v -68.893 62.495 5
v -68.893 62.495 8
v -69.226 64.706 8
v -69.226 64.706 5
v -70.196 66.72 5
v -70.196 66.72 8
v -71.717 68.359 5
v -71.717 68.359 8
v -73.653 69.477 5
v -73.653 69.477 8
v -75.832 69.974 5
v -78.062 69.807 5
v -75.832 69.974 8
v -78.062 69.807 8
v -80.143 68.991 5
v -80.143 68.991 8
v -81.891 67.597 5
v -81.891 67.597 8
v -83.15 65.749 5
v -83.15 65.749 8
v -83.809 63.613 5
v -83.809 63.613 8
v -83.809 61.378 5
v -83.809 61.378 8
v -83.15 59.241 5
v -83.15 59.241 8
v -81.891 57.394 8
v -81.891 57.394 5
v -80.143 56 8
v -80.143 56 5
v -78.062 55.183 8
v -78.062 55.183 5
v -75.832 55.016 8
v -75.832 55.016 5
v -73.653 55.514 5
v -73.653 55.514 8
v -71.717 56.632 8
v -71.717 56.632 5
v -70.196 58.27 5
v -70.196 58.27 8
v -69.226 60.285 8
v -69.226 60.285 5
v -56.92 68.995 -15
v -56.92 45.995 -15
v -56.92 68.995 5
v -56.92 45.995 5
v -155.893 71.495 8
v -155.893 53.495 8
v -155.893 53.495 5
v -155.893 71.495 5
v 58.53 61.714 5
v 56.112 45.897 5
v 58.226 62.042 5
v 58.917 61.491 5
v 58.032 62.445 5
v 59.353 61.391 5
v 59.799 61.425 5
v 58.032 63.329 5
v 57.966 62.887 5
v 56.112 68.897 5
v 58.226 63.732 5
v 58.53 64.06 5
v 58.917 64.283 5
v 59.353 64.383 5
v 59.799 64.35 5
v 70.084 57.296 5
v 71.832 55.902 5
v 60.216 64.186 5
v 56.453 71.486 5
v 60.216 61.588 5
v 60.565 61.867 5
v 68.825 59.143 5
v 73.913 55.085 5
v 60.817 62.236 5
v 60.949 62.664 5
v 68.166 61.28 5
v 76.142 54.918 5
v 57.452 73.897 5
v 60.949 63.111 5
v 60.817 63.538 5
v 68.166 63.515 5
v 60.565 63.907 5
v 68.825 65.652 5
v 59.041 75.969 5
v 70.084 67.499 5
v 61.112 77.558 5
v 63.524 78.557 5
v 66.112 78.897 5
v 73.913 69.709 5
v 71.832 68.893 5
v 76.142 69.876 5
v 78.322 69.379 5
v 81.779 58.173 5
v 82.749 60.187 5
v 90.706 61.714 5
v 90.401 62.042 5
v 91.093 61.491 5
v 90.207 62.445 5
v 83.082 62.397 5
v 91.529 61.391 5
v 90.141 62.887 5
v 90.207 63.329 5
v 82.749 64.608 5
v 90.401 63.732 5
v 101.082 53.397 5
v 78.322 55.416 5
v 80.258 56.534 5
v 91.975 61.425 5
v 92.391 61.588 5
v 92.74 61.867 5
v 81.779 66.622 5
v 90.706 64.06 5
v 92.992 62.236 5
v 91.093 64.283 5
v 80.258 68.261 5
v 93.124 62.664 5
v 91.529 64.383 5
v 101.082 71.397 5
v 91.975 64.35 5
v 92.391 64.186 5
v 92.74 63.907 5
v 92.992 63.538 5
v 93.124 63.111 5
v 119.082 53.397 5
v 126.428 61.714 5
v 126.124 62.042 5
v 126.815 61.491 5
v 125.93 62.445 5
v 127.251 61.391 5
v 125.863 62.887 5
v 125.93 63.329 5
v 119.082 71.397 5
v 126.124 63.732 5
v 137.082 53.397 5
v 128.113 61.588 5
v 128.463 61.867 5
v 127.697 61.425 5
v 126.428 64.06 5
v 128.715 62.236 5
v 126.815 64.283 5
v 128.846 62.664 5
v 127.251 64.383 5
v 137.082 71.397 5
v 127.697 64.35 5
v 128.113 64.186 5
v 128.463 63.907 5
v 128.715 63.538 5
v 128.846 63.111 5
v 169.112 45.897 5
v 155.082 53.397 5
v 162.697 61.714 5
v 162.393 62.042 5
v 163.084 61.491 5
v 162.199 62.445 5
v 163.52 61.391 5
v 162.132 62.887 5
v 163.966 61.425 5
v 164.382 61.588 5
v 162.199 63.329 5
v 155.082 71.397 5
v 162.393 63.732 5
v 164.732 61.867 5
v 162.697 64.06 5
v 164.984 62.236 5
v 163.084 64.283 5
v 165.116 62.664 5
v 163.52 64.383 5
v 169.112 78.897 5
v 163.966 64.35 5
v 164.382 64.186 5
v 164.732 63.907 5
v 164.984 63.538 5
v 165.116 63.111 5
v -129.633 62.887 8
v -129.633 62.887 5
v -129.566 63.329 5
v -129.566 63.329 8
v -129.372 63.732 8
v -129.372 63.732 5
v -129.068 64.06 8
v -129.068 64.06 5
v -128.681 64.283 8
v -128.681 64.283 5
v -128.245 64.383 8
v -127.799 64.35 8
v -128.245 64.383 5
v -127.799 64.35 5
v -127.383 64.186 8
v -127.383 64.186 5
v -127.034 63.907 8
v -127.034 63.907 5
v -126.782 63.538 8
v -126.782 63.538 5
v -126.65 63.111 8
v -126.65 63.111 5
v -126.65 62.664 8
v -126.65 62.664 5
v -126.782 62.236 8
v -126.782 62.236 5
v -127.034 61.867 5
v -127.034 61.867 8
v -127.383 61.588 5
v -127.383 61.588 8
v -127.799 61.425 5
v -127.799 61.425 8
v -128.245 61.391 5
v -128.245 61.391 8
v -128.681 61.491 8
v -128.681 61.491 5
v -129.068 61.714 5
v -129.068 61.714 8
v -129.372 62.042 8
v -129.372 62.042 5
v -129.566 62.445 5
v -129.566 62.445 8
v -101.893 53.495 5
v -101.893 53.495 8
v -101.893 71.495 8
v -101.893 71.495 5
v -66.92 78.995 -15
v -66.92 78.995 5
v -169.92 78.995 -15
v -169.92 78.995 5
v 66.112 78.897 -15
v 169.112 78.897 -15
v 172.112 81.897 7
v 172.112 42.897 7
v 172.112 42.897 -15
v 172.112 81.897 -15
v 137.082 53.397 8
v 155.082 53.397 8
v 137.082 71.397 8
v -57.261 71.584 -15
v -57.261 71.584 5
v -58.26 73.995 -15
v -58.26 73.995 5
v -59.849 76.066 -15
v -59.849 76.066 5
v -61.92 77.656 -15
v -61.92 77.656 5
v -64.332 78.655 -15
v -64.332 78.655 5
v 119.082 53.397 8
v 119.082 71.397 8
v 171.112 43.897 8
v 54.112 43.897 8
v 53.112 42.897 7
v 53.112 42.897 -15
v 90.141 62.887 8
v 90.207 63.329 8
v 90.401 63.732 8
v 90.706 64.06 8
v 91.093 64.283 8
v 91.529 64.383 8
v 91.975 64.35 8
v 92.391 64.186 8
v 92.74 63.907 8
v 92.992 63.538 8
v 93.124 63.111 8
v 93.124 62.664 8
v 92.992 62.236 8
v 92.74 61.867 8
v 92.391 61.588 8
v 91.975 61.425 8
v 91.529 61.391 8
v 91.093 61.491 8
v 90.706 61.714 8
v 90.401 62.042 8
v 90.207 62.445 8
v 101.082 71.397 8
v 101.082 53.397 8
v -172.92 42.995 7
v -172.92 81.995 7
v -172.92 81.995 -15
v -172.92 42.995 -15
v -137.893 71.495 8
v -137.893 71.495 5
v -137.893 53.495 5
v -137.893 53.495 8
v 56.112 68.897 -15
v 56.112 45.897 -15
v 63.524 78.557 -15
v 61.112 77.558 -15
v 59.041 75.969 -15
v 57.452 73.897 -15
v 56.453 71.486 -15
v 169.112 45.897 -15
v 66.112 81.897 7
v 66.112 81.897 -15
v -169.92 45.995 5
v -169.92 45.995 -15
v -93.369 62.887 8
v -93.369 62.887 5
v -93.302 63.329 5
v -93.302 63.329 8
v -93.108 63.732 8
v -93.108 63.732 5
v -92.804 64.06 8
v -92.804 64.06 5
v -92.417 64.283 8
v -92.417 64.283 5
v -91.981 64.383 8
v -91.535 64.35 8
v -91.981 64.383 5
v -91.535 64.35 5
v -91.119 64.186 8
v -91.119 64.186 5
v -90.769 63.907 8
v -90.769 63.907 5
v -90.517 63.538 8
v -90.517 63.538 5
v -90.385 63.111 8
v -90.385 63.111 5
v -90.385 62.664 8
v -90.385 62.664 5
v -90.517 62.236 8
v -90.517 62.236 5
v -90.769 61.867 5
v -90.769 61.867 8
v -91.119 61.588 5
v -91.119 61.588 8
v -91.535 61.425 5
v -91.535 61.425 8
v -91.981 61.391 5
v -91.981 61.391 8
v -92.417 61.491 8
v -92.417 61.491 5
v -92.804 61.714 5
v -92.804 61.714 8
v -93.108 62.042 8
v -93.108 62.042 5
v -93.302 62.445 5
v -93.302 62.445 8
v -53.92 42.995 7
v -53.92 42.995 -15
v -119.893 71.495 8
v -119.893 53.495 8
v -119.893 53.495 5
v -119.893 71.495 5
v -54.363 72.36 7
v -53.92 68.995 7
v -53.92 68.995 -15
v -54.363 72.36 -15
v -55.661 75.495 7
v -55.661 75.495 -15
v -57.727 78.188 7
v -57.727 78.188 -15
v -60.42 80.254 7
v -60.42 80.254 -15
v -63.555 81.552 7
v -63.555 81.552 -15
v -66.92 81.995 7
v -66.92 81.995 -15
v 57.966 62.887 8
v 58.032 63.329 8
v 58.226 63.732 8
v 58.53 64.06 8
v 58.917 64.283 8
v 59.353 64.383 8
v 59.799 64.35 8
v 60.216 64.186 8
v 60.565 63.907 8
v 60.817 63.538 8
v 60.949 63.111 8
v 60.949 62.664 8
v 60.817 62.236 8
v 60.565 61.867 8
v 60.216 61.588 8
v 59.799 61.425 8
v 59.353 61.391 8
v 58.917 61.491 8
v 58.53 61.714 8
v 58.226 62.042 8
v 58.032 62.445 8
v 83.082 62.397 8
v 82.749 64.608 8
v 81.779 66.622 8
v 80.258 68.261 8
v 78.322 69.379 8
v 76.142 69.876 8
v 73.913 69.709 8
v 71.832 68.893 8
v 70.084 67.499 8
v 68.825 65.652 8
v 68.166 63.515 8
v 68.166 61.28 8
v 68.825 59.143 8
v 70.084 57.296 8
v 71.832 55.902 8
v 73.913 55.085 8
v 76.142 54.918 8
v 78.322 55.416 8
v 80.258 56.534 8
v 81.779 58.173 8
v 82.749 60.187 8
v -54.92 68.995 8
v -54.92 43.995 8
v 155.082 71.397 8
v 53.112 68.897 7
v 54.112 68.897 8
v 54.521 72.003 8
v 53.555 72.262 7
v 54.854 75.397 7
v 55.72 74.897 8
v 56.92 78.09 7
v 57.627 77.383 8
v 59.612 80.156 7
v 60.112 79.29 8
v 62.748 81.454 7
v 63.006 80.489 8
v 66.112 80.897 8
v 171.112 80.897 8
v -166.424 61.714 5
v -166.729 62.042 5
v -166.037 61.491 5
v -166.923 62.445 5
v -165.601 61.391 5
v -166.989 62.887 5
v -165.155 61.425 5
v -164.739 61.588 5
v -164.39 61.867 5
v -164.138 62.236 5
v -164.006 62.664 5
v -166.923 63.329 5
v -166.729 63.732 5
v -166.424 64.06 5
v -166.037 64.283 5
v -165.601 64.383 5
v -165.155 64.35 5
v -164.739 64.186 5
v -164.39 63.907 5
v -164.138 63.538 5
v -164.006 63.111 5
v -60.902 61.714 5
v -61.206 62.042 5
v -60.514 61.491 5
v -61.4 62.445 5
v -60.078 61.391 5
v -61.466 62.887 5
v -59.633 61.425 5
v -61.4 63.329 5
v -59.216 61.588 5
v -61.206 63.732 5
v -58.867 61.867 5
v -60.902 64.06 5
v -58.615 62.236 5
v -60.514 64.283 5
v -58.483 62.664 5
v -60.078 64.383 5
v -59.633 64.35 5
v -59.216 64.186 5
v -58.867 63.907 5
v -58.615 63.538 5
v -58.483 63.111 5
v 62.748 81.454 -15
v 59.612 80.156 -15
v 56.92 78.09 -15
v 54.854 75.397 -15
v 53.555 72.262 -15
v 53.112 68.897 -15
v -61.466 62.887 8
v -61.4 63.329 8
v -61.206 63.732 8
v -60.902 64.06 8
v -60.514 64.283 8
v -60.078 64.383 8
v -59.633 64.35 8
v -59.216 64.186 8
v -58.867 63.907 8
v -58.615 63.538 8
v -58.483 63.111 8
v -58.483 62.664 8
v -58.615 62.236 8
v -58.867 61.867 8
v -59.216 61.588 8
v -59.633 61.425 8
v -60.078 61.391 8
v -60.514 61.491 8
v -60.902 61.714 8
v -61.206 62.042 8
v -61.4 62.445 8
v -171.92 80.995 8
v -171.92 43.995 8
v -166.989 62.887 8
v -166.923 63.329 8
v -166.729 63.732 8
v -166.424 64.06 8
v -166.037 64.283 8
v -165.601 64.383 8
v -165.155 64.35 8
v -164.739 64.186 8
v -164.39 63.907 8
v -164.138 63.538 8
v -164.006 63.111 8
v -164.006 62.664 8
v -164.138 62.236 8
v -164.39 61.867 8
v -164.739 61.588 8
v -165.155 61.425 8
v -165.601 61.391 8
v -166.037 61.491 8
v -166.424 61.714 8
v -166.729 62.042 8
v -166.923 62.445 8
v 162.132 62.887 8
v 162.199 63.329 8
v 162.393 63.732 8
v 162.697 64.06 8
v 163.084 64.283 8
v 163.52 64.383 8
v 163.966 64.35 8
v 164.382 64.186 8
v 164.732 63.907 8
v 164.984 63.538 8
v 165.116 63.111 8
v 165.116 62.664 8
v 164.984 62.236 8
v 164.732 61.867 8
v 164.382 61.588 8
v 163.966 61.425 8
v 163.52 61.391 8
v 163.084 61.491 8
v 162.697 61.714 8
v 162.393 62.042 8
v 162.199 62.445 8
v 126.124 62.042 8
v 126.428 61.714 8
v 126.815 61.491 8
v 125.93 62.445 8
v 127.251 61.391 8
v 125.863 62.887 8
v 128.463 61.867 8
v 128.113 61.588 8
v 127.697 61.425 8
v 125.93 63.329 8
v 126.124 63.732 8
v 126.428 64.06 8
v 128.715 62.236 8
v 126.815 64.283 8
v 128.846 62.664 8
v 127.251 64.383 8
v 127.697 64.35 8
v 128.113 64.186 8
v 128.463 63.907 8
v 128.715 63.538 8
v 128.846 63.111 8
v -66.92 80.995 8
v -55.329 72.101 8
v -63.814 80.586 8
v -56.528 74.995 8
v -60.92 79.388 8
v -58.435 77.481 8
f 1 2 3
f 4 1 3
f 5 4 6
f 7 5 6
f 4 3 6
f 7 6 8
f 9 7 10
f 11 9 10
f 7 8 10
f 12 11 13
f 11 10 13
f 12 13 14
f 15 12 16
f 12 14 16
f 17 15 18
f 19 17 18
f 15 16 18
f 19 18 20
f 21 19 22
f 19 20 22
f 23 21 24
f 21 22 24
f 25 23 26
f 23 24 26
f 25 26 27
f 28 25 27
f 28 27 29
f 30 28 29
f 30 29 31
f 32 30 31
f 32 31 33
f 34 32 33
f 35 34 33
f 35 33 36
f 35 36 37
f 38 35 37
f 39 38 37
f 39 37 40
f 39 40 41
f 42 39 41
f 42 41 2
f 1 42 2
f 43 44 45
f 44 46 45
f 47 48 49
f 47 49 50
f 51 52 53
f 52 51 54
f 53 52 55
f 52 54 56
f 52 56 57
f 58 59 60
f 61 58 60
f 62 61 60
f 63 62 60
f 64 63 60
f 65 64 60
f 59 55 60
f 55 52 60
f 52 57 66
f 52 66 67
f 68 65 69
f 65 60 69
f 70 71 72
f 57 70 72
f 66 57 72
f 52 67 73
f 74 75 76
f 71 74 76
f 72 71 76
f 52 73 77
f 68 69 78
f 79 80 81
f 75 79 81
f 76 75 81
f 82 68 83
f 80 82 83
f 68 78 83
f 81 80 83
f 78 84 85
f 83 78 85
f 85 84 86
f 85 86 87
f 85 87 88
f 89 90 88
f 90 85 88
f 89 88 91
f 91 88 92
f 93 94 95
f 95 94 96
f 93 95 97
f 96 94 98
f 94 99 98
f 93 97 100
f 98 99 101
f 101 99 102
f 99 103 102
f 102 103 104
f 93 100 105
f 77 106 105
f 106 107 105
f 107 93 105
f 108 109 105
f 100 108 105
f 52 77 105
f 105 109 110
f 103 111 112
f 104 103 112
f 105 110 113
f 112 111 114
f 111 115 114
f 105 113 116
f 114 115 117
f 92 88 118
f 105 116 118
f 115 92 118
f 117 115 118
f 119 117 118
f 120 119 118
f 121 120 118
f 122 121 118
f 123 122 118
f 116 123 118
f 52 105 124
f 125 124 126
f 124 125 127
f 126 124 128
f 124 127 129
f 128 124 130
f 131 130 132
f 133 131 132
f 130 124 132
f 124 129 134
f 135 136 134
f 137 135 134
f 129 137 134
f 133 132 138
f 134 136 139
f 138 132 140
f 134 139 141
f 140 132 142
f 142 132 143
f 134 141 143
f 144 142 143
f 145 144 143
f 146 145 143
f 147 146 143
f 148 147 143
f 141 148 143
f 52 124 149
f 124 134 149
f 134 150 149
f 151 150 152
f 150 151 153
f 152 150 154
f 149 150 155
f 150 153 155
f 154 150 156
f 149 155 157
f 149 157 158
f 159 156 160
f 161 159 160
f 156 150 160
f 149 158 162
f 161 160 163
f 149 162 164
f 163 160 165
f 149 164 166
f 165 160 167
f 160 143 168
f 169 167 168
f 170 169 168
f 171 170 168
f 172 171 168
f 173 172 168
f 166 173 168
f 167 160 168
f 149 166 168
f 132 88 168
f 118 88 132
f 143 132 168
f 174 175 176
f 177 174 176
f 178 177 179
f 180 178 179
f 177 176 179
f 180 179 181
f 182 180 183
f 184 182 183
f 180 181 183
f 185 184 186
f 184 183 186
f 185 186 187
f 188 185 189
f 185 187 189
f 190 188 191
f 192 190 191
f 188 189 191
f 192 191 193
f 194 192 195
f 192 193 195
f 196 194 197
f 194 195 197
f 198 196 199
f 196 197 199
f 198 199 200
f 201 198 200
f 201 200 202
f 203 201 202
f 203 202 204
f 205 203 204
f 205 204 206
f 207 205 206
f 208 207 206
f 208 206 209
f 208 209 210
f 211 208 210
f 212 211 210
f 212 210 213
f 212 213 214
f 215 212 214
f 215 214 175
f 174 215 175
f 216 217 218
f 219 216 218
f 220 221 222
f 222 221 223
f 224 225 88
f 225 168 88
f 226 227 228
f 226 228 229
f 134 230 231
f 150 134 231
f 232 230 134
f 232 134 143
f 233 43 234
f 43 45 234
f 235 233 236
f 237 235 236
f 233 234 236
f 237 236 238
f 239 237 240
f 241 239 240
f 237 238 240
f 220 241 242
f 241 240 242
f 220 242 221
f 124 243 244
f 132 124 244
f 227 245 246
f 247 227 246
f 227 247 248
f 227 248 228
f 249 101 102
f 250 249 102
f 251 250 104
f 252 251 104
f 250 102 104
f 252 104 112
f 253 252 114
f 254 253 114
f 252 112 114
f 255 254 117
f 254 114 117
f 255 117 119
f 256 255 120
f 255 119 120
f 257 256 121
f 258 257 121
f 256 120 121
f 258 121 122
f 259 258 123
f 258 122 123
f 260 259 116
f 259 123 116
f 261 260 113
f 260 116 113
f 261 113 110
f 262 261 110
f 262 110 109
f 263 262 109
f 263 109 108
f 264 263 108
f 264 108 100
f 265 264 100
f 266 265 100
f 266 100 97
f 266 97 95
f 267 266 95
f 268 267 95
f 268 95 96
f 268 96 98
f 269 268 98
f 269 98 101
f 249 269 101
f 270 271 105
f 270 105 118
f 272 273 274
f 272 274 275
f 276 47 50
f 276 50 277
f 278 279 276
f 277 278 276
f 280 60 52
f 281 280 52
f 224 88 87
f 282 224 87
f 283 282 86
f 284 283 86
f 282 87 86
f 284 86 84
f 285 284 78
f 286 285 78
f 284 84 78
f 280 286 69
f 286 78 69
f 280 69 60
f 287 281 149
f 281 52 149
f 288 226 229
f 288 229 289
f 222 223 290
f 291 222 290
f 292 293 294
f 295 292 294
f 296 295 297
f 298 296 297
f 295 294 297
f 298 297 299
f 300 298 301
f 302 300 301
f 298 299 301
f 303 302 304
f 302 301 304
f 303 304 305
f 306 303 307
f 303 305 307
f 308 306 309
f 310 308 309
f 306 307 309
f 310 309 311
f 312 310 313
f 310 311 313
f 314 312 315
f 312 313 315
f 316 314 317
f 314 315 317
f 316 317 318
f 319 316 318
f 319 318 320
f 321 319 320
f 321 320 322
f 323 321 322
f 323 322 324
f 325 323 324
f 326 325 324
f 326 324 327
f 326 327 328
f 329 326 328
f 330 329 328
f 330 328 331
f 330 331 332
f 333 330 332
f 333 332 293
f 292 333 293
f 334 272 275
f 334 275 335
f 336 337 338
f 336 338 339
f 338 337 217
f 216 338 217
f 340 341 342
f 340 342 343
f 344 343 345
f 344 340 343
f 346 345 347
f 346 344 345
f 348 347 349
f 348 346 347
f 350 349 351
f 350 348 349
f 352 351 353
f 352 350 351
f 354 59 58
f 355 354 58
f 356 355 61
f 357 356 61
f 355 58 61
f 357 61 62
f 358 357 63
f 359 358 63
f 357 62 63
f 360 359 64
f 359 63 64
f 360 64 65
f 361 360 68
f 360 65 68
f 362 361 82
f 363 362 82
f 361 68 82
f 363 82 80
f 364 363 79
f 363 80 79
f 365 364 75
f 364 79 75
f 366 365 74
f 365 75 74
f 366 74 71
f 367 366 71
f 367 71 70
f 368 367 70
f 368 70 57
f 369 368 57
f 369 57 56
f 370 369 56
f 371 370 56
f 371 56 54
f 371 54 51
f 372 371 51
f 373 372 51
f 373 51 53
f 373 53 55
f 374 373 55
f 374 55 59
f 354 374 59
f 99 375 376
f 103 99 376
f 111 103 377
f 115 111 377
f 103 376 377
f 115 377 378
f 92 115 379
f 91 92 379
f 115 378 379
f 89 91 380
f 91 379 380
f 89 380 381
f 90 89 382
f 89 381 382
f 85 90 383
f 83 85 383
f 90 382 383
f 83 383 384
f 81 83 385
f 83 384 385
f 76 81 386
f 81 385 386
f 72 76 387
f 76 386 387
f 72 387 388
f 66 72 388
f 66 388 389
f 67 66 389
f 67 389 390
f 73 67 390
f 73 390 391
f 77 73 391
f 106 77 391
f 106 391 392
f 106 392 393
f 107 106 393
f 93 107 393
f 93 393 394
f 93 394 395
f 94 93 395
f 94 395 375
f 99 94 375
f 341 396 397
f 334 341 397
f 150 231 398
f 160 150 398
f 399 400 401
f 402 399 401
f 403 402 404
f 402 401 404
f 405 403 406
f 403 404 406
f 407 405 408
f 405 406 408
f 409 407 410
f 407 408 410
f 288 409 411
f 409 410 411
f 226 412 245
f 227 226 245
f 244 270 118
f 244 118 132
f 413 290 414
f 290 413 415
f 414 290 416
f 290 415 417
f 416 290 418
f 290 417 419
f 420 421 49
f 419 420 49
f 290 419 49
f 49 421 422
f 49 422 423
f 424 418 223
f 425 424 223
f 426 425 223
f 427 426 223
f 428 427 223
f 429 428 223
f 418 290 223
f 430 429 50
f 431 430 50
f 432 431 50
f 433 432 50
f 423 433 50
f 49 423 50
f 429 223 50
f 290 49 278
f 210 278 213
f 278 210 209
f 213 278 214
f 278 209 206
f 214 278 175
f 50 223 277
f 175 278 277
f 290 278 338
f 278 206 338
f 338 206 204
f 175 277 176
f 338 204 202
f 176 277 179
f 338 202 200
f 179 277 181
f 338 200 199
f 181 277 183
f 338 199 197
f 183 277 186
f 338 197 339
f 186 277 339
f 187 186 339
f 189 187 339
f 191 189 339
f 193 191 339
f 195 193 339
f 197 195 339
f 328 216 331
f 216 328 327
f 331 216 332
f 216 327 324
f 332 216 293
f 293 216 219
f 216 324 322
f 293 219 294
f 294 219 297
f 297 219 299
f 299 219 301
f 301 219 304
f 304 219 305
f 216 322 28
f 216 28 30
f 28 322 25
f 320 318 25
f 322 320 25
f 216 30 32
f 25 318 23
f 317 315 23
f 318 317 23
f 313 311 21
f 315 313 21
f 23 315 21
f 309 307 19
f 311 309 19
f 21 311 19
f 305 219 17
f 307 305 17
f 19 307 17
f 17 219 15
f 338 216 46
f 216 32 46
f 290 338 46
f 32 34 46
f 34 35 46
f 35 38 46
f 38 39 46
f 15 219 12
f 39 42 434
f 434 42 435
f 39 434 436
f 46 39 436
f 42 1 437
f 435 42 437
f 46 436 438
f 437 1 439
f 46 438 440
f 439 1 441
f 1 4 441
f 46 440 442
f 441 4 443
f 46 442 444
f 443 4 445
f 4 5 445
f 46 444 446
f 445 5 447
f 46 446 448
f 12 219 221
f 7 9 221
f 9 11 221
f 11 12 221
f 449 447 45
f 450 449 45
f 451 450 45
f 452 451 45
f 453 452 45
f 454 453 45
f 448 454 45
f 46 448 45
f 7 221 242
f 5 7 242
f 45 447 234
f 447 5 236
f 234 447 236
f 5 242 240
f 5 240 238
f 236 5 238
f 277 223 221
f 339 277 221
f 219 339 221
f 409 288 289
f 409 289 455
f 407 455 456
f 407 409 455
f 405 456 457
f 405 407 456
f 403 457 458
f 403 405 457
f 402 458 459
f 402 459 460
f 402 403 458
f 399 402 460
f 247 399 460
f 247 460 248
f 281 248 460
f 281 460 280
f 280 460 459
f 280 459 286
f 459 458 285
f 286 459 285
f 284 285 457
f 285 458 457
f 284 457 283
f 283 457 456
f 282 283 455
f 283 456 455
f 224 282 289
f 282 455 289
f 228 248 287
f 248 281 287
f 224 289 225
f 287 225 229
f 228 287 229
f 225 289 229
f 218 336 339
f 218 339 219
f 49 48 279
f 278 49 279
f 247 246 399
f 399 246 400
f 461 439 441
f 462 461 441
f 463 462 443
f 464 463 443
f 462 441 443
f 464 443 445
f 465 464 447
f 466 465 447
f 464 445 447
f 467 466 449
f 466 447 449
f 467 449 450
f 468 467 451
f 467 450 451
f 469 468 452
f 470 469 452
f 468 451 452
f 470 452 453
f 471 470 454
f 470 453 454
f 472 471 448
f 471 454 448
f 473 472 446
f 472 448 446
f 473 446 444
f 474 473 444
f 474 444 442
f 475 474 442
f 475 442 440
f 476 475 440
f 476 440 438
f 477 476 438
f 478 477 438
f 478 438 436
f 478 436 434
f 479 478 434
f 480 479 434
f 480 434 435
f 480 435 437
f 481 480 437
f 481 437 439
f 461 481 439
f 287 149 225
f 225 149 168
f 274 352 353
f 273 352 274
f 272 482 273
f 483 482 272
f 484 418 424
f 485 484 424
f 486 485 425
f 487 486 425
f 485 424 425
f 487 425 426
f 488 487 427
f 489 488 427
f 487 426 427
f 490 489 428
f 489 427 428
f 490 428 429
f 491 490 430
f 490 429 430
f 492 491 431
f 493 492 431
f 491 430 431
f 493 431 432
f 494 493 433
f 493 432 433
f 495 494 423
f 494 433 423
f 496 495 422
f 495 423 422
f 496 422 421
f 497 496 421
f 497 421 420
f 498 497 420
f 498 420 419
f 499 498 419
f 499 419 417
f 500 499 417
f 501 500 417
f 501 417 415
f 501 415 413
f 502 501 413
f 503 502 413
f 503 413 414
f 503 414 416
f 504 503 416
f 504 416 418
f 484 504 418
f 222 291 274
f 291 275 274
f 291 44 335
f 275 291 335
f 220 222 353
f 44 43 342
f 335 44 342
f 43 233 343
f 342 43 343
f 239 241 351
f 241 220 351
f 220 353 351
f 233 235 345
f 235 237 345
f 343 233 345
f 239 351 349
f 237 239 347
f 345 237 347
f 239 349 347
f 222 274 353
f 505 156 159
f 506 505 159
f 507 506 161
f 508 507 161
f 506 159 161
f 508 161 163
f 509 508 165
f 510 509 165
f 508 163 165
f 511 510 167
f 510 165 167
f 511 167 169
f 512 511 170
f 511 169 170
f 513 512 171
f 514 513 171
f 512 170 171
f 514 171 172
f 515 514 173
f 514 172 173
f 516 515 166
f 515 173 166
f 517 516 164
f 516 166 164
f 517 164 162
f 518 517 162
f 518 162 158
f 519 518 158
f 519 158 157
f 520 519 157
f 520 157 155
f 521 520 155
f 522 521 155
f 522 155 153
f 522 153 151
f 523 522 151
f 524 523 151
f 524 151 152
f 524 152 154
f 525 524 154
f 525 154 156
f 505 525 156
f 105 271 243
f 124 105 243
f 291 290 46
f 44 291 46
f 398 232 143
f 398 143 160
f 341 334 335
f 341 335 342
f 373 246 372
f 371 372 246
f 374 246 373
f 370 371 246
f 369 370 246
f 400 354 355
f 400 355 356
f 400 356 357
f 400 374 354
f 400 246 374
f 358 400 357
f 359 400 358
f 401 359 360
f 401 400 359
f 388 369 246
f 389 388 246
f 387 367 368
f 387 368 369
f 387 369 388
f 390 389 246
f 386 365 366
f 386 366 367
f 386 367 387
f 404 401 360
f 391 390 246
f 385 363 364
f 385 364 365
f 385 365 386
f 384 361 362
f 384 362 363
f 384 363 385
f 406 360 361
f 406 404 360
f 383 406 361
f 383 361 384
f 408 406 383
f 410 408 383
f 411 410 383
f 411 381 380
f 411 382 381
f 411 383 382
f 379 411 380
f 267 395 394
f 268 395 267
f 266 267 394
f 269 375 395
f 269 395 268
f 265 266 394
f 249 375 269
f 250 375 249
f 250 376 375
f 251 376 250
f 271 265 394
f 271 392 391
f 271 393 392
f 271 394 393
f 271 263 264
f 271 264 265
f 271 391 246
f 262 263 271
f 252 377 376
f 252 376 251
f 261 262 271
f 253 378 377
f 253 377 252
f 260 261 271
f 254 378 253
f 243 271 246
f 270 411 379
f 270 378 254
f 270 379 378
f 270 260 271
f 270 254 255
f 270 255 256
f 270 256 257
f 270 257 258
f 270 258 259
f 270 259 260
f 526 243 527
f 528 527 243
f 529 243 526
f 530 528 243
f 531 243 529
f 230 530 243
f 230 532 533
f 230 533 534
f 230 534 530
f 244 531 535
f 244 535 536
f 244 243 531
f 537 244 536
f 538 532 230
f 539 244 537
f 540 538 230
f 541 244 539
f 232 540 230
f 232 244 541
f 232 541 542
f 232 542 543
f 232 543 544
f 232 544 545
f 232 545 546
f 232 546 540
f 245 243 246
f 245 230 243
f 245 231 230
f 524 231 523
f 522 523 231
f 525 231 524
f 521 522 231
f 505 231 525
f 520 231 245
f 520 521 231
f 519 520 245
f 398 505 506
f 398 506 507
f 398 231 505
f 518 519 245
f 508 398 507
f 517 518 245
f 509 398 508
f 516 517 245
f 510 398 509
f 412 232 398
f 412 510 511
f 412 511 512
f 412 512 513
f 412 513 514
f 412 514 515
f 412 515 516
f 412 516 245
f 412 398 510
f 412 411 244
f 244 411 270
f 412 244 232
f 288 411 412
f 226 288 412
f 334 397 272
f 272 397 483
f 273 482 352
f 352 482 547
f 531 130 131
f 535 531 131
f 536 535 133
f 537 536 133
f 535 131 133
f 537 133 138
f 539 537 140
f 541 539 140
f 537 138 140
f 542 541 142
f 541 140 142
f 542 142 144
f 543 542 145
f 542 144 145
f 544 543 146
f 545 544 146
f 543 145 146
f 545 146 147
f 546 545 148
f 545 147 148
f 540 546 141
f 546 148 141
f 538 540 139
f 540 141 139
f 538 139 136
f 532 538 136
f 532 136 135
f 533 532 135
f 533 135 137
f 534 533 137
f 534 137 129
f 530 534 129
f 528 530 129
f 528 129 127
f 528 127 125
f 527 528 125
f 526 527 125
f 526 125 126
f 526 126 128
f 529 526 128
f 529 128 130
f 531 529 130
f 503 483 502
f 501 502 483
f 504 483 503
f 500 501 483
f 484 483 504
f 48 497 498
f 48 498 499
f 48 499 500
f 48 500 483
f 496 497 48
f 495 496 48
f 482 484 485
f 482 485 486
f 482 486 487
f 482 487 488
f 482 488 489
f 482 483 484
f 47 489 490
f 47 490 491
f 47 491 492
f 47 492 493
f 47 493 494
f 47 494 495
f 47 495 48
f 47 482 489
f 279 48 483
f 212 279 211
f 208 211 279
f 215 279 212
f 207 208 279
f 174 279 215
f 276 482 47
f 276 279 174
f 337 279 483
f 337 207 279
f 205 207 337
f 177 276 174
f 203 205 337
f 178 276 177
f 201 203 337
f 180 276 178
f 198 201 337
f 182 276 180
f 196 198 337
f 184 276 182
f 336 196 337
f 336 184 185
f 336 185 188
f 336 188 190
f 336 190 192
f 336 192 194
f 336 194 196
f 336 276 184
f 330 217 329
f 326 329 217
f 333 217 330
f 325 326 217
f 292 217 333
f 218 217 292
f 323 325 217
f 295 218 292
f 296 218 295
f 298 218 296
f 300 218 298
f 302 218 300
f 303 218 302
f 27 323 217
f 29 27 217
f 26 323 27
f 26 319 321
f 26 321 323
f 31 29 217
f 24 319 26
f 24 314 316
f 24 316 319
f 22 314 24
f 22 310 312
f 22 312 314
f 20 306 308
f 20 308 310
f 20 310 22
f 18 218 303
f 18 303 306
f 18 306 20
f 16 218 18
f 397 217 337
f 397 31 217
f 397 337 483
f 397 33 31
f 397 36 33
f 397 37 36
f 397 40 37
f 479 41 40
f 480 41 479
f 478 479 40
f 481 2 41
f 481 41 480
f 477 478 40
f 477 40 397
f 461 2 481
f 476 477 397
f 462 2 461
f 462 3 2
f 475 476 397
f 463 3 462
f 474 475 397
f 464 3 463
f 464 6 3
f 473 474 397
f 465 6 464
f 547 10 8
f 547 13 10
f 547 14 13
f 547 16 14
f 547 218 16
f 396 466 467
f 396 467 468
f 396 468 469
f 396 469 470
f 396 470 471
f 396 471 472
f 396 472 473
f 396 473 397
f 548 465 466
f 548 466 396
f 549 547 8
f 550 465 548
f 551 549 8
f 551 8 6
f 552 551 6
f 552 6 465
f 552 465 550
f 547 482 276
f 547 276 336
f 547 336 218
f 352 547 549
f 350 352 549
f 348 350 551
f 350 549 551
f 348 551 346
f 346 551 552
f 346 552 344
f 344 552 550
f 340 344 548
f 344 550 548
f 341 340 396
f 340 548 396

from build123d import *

# Parameters (mm, degrees)
F1_DEPTH      = 5
F1_DEPTH_BACK = 15
F2_T          = 3
F2_2_T        = 3
F4_W          = 18
F4_H          = 18
F4_R          = 7.5
F5_DEPTH      = 50
F8_D          = 3
F8_DEPTH      = 40
F8_TIP        = 0.9012909285
F8_2_D        = 3
F8_2_DEPTH    = 40
F8_2_TIP      = 0.9012909285
F9_SIZE       = 1
F9_2_SIZE     = 1


with BuildPart() as f1:
    # F0 (on Top) → F1 (new body, two sides)
    with BuildSketch(Plane.XY) as f1_sk:
        with BuildLine():
            Line((169.1123094261, 78.8974409995), (66.1123094261, 78.8974409995))
            ThreePointArc((66.1123094261, 78.8974409995), (59.0412416142, 75.9685088113), (56.1123094261, 68.8974409995))
            Line((56.1123094261, 68.8974409995), (56.1123094261, 45.8974409995))
            Line((56.1123094261, 45.8974409995), (169.1123094261, 45.8974409995))
            Line((169.1123094261, 45.8974409995), (169.1123094261, 78.8974409995))
        make_face()
    extrude(amount=F1_DEPTH)
    extrude(f1_sk.sketch, amount=-F1_DEPTH_BACK)

    # F2
    f2_openings = [f1.faces().sort_by_distance(p)[0] for p in [
        (112.926417, 62.314864, -15),
    ]]
    offset(amount=F2_T, openings=f2_openings, kind=Kind.INTERSECTION)


with BuildPart() as f1b:
    # F0 (on Top) → F1, piece 2 (new body, two sides)
    with BuildSketch(Plane.XY) as f1_2_sk:
        with BuildLine():
            Line((-66.9198182523, 78.9953285099), (-169.9198182523, 78.9953285099))
            Line((-169.9198182523, 78.9953285099), (-169.9198182523, 45.9953285099))
            Line((-169.9198182523, 45.9953285099), (-56.9198182523, 45.9953285099))
            Line((-56.9198182523, 45.9953285099), (-56.9198182523, 68.9953285099))
            ThreePointArc((-56.9198182523, 68.9953285099), (-59.8487504405, 76.0663963218), (-66.9198182523, 78.9953285099))
        make_face()
    extrude(amount=F1_DEPTH)
    extrude(f1_2_sk.sketch, amount=-F1_DEPTH_BACK)

    # F2#2
    f2_2_openings = [f1b.faces().sort_by_distance(p)[0] for p in [
        (-113.733926, 62.412751, -15),
    ]]
    offset(amount=F2_2_T, openings=f2_2_openings, kind=Kind.INTERSECTION)


with BuildPart() as f5_tool:
    # F4 (on offset) → F5 (new body)
    with BuildSketch(Plane.XY.offset(33)):
        with Locations((-146.8929139701, 62.4953285099)):
            Rectangle(F4_W, F4_H)
        with Locations((-110.8929139701, 62.4953285099)):
            Rectangle(F4_W, F4_H)
        with Locations((-76.3929139701, 62.4953285099)):
            Circle(F4_R)
        with Locations((75.5820007977, 62.3974409995)):
            Circle(F4_R)
        with Locations((110.0820007977, 62.3974409995)):
            Rectangle(F4_W, F4_H)
        with Locations((146.0820007977, 62.3974409995)):
            Rectangle(F4_W, F4_H)
    extrude(amount=-F5_DEPTH)


with BuildPart() as f1_1:
    add(f1.part)

    # F5: cut by f5_tool
    add(f5_tool.part, mode=Mode.SUBTRACT)

    # F8
    with Locations(Plane.XY.offset(8)):
        with Locations((-128.1331330538, 62.8871805966), (163.6322605932, 62.8871805966), (127.36319817, 62.8871805966), (-165.489256382, 62.8871805966), (91.6408523917, 62.8871805966), (59.4655014575, 62.8871805966), (-91.8687133804, 62.8871805966), (-59.9663094311, 62.8871805966)):
            Hole(F8_D / 2, depth=F8_DEPTH)
            with Locations((0, 0, -(F8_DEPTH + F8_TIP / 2))):  # 118° drill point
                Cone(0, F8_D / 2, F8_TIP, mode=Mode.SUBTRACT)

    # F9
    f9_edges = [f1_1.edges().sort_by_distance(p)[0] for p in [
        (112.612309, 42.897441, 8),
        (172.112309, 62.397441, 8),
        (119.112309, 81.897441, 8),
        (56.919921, 78.089829, 8),
        (53.112309, 55.897441, 8),
    ]]
    chamfer(f9_edges, length=F9_SIZE)


with BuildPart() as f1b_1:
    add(f1b.part)

    # F5: cut by f5_tool
    add(f5_tool.part, mode=Mode.SUBTRACT)

    # F8#2
    with Locations(Plane.XY.offset(8)):
        with Locations((-128.1331330538, 62.8871805966), (163.6322605932, 62.8871805966), (127.36319817, 62.8871805966), (-165.489256382, 62.8871805966), (91.6408523917, 62.8871805966), (59.4655014575, 62.8871805966), (-91.8687133804, 62.8871805966), (-59.9663094311, 62.8871805966)):
            Hole(F8_2_D / 2, depth=F8_2_DEPTH)
            with Locations((0, 0, -(F8_2_DEPTH + F8_2_TIP / 2))):  # 118° drill point
                Cone(0, F8_2_D / 2, F8_2_TIP, mode=Mode.SUBTRACT)

    # F9#2
    f9_2_edges = [f1b_1.edges().sort_by_distance(p)[0] for p in [
        (-53.919818, 55.995329, 8),
        (-57.72743, 78.187717, 8),
        (-119.919818, 81.995329, 8),
        (-172.919818, 62.495329, 8),
        (-113.419818, 42.995329, 8),
    ]]
    chamfer(f9_2_edges, length=F9_2_SIZE)


solid = Compound([f1_1.part, f1b_1.part])
